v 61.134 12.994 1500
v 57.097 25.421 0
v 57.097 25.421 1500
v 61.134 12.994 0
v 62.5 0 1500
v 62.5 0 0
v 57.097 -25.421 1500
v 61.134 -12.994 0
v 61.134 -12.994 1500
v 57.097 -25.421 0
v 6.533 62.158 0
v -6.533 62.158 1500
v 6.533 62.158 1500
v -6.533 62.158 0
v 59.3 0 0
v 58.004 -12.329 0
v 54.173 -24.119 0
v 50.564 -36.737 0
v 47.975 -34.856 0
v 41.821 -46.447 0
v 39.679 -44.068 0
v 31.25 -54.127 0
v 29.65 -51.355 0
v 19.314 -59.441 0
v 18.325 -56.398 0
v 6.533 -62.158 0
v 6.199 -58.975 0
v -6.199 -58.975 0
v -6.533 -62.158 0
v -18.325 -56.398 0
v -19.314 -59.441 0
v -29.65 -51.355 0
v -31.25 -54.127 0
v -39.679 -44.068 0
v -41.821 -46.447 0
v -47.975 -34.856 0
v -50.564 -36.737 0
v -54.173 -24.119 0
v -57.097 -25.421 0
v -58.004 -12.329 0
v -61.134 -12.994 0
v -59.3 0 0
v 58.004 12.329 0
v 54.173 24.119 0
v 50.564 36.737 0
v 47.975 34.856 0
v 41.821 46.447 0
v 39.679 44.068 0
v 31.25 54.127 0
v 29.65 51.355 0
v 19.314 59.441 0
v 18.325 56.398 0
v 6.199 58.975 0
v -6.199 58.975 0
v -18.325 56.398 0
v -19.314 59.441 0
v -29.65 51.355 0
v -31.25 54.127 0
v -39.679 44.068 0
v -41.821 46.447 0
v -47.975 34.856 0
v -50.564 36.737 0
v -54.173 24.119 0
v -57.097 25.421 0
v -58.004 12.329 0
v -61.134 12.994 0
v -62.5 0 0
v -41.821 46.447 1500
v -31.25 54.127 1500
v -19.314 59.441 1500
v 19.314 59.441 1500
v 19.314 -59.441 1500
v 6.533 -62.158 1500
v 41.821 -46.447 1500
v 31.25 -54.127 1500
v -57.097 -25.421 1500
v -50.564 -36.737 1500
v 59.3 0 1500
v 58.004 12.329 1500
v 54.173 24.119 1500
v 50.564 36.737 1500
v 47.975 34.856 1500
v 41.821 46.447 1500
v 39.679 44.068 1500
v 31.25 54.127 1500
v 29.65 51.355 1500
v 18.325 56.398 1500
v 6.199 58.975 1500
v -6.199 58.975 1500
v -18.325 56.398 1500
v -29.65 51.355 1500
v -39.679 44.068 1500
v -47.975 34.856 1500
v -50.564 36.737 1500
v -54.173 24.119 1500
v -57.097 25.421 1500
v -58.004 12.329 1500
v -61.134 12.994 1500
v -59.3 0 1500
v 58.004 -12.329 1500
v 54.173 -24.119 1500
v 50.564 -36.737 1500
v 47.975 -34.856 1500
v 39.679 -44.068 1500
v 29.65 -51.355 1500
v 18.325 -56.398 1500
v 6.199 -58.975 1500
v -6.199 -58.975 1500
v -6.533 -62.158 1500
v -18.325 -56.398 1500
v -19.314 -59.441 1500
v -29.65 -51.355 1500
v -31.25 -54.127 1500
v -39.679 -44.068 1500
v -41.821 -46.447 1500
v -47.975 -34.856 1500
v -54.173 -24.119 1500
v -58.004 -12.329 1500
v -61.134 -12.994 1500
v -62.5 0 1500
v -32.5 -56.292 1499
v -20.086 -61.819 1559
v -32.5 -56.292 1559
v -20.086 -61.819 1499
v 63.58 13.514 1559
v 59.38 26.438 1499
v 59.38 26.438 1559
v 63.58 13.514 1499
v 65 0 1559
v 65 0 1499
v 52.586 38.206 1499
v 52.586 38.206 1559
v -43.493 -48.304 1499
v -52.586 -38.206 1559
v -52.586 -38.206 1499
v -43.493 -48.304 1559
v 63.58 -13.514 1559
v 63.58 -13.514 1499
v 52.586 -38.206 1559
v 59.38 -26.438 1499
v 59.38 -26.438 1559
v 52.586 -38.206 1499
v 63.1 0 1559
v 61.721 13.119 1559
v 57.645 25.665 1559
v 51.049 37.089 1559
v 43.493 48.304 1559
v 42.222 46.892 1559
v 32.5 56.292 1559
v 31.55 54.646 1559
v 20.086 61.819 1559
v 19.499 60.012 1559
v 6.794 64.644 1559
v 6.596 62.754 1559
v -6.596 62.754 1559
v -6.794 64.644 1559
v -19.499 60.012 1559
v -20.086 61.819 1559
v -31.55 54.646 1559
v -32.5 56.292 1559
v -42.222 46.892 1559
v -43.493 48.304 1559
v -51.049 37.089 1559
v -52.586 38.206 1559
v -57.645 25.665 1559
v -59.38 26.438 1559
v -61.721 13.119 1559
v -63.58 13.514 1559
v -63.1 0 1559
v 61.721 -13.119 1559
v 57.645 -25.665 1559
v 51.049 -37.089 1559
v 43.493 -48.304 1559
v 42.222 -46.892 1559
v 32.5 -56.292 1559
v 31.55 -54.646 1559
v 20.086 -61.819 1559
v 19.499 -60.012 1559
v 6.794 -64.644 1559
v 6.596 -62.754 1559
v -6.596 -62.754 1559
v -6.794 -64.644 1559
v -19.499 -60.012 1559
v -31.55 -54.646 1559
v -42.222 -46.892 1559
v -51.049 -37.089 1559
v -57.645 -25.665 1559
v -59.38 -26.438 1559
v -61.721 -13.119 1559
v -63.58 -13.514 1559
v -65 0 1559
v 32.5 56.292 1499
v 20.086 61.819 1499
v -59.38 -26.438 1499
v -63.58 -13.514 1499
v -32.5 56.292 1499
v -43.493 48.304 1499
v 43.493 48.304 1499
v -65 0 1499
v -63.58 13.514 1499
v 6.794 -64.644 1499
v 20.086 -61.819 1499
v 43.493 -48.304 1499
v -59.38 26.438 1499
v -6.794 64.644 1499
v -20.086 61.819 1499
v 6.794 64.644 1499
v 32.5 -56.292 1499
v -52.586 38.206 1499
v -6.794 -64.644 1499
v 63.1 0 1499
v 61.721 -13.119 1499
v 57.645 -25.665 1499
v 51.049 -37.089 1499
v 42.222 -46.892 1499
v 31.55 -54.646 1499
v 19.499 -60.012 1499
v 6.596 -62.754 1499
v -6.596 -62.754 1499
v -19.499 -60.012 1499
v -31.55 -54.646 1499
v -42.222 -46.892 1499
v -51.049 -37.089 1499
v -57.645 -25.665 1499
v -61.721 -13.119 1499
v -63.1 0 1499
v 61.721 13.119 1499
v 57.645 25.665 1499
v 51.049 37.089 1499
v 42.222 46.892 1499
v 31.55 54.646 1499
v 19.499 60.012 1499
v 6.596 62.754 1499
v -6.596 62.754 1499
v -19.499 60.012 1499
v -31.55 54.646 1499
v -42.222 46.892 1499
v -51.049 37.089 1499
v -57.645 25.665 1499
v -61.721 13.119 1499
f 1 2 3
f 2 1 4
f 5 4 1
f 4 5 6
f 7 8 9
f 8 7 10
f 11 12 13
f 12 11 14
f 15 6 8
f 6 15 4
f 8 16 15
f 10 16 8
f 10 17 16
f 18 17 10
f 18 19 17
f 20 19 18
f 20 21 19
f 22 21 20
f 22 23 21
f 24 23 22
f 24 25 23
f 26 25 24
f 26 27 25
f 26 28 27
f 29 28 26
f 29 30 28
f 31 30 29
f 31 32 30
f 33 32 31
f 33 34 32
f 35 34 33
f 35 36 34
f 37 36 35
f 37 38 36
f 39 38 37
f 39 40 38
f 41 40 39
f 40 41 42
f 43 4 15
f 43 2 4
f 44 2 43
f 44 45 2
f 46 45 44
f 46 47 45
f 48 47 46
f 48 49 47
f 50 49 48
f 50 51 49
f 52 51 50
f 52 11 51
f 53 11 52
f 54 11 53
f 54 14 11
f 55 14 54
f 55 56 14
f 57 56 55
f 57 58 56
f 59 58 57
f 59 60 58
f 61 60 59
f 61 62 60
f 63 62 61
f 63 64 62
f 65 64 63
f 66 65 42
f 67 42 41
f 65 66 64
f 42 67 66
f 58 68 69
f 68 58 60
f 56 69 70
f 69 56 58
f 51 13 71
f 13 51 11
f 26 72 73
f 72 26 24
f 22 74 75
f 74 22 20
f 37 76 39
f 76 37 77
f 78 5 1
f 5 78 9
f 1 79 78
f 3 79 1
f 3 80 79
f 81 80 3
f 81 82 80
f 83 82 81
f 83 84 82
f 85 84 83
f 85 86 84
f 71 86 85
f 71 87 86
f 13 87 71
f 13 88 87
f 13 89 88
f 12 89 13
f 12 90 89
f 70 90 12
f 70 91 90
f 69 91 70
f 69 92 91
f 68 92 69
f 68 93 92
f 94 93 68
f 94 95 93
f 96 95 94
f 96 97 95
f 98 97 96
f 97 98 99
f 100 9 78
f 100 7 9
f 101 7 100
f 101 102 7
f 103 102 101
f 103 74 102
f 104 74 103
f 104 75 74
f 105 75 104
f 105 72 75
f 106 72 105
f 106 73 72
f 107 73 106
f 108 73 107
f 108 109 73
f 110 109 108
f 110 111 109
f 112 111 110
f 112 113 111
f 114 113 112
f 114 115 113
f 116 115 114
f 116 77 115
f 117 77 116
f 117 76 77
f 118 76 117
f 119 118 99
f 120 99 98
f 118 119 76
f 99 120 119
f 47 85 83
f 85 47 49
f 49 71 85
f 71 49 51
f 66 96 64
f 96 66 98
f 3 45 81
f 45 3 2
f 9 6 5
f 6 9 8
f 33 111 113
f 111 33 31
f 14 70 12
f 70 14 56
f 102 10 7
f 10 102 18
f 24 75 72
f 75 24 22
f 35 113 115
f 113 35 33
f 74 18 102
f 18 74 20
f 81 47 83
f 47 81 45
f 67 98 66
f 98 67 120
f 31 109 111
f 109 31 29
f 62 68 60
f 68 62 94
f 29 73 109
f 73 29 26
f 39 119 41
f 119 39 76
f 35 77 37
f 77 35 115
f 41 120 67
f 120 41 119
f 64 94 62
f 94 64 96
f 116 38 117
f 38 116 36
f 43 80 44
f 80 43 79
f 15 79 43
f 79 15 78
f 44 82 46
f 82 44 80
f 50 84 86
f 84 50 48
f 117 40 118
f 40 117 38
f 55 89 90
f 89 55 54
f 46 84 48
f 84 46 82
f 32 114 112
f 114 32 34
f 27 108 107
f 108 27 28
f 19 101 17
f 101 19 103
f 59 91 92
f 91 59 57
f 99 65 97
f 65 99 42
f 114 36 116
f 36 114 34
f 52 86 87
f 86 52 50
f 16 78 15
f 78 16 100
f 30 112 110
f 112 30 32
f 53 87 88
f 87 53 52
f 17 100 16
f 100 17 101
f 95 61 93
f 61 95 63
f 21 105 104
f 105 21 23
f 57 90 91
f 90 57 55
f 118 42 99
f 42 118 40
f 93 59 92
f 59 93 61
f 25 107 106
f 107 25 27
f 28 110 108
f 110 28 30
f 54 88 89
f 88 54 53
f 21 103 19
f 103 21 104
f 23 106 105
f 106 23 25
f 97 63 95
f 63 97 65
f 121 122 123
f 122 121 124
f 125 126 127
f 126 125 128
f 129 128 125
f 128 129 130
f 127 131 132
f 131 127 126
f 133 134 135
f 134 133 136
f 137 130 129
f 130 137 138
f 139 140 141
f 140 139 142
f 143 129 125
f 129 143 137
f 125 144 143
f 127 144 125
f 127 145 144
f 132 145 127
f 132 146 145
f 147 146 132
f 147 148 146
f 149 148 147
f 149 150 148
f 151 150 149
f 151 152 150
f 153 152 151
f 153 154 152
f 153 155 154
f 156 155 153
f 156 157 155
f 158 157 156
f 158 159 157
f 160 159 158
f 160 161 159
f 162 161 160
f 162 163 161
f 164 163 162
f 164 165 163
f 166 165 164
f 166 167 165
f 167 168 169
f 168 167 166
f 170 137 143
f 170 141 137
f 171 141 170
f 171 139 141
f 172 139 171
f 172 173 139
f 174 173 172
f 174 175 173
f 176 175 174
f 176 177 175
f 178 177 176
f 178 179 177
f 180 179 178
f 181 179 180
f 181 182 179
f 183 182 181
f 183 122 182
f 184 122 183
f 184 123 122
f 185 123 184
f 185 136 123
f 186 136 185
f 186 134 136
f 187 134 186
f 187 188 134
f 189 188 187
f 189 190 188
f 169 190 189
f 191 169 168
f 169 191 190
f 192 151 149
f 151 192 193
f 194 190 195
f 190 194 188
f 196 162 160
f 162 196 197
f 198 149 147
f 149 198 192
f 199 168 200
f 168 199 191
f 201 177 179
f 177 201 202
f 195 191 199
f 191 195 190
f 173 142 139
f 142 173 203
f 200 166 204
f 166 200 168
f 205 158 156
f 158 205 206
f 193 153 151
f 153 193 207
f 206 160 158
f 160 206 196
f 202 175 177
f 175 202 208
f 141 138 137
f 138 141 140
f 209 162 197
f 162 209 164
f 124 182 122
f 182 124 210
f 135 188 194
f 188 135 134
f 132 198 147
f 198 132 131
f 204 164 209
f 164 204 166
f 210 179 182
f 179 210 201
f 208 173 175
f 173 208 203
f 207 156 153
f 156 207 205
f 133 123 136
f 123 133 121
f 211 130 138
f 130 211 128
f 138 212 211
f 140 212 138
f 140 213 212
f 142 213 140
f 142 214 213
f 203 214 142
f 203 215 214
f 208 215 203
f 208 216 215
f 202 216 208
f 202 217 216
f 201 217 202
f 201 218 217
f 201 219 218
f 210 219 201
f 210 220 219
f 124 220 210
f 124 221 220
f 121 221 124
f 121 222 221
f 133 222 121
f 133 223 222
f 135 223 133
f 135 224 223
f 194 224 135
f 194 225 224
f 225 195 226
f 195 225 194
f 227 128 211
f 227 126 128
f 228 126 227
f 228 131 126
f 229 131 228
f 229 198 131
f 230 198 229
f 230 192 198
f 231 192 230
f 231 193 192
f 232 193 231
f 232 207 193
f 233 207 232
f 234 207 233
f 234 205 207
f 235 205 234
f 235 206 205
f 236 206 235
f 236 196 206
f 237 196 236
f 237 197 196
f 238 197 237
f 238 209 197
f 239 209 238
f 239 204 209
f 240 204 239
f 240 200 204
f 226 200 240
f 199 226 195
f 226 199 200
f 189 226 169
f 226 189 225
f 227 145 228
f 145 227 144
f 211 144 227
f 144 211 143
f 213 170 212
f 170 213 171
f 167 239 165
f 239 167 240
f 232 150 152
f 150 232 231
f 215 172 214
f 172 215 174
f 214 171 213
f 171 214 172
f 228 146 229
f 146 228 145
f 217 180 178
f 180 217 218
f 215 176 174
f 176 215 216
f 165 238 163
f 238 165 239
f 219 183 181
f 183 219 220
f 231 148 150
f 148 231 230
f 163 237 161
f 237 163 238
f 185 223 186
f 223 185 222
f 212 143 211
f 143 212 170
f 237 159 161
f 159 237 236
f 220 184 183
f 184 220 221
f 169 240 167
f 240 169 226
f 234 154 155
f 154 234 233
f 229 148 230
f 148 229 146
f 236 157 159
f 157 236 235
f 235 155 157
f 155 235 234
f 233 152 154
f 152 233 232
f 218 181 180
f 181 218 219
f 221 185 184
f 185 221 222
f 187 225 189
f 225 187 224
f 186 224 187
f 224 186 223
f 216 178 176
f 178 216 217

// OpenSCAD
// Parameters
nominal_diameter_mm = 125; //[60:250:1]
length_mm = 1500; //[750:3000:10]
outer_diameter_mm = 125; //[60:250:1]
wall_thickness_mm = 3.2; //[1.6:6.4:0.1]
include_end_fitting = 1; //[0:1:1]
overlap_mm = 1; //[0.5:2:0.1]
socket_length_mm = 60; //[30:120:1]
socket_wall_extra_mm = 2.5; //[1:6:0.1]
socket_bore_clearance_mm = 0.6; //[0.2:1.5:0.1]

// HT Pipe Segment - complete geometry
module ht_pipe() {
  color([0.85, 0.85, 0.8]) { // PVC color
    // Main pipe segment
    difference() {
      translate([0, 0, 0])
        cylinder(h=length_mm, r=outer_diameter_mm/2, center=false);
      translate([0, 0, -overlap_mm])
        cylinder(h=length_mm + 2*overlap_mm, r=outer_diameter_mm/2 - wall_thickness_mm, center=false);
    }
    
    // End fitting geometry
    if (include_end_fitting) {
      difference() {
        translate([0, 0, length_mm - overlap_mm])
          cylinder(h=socket_length_mm, r=outer_diameter_mm/2 + socket_wall_extra_mm, center=false);
        translate([0, 0, length_mm - overlap_mm - overlap_mm])
          cylinder(h=socket_length_mm + 2*overlap_mm, r=outer_diameter_mm/2 + socket_bore_clearance_mm, center=false);
      }
    }
  }
}

// Assembly
module assembly() {
  ht_pipe();
}

assembly();
